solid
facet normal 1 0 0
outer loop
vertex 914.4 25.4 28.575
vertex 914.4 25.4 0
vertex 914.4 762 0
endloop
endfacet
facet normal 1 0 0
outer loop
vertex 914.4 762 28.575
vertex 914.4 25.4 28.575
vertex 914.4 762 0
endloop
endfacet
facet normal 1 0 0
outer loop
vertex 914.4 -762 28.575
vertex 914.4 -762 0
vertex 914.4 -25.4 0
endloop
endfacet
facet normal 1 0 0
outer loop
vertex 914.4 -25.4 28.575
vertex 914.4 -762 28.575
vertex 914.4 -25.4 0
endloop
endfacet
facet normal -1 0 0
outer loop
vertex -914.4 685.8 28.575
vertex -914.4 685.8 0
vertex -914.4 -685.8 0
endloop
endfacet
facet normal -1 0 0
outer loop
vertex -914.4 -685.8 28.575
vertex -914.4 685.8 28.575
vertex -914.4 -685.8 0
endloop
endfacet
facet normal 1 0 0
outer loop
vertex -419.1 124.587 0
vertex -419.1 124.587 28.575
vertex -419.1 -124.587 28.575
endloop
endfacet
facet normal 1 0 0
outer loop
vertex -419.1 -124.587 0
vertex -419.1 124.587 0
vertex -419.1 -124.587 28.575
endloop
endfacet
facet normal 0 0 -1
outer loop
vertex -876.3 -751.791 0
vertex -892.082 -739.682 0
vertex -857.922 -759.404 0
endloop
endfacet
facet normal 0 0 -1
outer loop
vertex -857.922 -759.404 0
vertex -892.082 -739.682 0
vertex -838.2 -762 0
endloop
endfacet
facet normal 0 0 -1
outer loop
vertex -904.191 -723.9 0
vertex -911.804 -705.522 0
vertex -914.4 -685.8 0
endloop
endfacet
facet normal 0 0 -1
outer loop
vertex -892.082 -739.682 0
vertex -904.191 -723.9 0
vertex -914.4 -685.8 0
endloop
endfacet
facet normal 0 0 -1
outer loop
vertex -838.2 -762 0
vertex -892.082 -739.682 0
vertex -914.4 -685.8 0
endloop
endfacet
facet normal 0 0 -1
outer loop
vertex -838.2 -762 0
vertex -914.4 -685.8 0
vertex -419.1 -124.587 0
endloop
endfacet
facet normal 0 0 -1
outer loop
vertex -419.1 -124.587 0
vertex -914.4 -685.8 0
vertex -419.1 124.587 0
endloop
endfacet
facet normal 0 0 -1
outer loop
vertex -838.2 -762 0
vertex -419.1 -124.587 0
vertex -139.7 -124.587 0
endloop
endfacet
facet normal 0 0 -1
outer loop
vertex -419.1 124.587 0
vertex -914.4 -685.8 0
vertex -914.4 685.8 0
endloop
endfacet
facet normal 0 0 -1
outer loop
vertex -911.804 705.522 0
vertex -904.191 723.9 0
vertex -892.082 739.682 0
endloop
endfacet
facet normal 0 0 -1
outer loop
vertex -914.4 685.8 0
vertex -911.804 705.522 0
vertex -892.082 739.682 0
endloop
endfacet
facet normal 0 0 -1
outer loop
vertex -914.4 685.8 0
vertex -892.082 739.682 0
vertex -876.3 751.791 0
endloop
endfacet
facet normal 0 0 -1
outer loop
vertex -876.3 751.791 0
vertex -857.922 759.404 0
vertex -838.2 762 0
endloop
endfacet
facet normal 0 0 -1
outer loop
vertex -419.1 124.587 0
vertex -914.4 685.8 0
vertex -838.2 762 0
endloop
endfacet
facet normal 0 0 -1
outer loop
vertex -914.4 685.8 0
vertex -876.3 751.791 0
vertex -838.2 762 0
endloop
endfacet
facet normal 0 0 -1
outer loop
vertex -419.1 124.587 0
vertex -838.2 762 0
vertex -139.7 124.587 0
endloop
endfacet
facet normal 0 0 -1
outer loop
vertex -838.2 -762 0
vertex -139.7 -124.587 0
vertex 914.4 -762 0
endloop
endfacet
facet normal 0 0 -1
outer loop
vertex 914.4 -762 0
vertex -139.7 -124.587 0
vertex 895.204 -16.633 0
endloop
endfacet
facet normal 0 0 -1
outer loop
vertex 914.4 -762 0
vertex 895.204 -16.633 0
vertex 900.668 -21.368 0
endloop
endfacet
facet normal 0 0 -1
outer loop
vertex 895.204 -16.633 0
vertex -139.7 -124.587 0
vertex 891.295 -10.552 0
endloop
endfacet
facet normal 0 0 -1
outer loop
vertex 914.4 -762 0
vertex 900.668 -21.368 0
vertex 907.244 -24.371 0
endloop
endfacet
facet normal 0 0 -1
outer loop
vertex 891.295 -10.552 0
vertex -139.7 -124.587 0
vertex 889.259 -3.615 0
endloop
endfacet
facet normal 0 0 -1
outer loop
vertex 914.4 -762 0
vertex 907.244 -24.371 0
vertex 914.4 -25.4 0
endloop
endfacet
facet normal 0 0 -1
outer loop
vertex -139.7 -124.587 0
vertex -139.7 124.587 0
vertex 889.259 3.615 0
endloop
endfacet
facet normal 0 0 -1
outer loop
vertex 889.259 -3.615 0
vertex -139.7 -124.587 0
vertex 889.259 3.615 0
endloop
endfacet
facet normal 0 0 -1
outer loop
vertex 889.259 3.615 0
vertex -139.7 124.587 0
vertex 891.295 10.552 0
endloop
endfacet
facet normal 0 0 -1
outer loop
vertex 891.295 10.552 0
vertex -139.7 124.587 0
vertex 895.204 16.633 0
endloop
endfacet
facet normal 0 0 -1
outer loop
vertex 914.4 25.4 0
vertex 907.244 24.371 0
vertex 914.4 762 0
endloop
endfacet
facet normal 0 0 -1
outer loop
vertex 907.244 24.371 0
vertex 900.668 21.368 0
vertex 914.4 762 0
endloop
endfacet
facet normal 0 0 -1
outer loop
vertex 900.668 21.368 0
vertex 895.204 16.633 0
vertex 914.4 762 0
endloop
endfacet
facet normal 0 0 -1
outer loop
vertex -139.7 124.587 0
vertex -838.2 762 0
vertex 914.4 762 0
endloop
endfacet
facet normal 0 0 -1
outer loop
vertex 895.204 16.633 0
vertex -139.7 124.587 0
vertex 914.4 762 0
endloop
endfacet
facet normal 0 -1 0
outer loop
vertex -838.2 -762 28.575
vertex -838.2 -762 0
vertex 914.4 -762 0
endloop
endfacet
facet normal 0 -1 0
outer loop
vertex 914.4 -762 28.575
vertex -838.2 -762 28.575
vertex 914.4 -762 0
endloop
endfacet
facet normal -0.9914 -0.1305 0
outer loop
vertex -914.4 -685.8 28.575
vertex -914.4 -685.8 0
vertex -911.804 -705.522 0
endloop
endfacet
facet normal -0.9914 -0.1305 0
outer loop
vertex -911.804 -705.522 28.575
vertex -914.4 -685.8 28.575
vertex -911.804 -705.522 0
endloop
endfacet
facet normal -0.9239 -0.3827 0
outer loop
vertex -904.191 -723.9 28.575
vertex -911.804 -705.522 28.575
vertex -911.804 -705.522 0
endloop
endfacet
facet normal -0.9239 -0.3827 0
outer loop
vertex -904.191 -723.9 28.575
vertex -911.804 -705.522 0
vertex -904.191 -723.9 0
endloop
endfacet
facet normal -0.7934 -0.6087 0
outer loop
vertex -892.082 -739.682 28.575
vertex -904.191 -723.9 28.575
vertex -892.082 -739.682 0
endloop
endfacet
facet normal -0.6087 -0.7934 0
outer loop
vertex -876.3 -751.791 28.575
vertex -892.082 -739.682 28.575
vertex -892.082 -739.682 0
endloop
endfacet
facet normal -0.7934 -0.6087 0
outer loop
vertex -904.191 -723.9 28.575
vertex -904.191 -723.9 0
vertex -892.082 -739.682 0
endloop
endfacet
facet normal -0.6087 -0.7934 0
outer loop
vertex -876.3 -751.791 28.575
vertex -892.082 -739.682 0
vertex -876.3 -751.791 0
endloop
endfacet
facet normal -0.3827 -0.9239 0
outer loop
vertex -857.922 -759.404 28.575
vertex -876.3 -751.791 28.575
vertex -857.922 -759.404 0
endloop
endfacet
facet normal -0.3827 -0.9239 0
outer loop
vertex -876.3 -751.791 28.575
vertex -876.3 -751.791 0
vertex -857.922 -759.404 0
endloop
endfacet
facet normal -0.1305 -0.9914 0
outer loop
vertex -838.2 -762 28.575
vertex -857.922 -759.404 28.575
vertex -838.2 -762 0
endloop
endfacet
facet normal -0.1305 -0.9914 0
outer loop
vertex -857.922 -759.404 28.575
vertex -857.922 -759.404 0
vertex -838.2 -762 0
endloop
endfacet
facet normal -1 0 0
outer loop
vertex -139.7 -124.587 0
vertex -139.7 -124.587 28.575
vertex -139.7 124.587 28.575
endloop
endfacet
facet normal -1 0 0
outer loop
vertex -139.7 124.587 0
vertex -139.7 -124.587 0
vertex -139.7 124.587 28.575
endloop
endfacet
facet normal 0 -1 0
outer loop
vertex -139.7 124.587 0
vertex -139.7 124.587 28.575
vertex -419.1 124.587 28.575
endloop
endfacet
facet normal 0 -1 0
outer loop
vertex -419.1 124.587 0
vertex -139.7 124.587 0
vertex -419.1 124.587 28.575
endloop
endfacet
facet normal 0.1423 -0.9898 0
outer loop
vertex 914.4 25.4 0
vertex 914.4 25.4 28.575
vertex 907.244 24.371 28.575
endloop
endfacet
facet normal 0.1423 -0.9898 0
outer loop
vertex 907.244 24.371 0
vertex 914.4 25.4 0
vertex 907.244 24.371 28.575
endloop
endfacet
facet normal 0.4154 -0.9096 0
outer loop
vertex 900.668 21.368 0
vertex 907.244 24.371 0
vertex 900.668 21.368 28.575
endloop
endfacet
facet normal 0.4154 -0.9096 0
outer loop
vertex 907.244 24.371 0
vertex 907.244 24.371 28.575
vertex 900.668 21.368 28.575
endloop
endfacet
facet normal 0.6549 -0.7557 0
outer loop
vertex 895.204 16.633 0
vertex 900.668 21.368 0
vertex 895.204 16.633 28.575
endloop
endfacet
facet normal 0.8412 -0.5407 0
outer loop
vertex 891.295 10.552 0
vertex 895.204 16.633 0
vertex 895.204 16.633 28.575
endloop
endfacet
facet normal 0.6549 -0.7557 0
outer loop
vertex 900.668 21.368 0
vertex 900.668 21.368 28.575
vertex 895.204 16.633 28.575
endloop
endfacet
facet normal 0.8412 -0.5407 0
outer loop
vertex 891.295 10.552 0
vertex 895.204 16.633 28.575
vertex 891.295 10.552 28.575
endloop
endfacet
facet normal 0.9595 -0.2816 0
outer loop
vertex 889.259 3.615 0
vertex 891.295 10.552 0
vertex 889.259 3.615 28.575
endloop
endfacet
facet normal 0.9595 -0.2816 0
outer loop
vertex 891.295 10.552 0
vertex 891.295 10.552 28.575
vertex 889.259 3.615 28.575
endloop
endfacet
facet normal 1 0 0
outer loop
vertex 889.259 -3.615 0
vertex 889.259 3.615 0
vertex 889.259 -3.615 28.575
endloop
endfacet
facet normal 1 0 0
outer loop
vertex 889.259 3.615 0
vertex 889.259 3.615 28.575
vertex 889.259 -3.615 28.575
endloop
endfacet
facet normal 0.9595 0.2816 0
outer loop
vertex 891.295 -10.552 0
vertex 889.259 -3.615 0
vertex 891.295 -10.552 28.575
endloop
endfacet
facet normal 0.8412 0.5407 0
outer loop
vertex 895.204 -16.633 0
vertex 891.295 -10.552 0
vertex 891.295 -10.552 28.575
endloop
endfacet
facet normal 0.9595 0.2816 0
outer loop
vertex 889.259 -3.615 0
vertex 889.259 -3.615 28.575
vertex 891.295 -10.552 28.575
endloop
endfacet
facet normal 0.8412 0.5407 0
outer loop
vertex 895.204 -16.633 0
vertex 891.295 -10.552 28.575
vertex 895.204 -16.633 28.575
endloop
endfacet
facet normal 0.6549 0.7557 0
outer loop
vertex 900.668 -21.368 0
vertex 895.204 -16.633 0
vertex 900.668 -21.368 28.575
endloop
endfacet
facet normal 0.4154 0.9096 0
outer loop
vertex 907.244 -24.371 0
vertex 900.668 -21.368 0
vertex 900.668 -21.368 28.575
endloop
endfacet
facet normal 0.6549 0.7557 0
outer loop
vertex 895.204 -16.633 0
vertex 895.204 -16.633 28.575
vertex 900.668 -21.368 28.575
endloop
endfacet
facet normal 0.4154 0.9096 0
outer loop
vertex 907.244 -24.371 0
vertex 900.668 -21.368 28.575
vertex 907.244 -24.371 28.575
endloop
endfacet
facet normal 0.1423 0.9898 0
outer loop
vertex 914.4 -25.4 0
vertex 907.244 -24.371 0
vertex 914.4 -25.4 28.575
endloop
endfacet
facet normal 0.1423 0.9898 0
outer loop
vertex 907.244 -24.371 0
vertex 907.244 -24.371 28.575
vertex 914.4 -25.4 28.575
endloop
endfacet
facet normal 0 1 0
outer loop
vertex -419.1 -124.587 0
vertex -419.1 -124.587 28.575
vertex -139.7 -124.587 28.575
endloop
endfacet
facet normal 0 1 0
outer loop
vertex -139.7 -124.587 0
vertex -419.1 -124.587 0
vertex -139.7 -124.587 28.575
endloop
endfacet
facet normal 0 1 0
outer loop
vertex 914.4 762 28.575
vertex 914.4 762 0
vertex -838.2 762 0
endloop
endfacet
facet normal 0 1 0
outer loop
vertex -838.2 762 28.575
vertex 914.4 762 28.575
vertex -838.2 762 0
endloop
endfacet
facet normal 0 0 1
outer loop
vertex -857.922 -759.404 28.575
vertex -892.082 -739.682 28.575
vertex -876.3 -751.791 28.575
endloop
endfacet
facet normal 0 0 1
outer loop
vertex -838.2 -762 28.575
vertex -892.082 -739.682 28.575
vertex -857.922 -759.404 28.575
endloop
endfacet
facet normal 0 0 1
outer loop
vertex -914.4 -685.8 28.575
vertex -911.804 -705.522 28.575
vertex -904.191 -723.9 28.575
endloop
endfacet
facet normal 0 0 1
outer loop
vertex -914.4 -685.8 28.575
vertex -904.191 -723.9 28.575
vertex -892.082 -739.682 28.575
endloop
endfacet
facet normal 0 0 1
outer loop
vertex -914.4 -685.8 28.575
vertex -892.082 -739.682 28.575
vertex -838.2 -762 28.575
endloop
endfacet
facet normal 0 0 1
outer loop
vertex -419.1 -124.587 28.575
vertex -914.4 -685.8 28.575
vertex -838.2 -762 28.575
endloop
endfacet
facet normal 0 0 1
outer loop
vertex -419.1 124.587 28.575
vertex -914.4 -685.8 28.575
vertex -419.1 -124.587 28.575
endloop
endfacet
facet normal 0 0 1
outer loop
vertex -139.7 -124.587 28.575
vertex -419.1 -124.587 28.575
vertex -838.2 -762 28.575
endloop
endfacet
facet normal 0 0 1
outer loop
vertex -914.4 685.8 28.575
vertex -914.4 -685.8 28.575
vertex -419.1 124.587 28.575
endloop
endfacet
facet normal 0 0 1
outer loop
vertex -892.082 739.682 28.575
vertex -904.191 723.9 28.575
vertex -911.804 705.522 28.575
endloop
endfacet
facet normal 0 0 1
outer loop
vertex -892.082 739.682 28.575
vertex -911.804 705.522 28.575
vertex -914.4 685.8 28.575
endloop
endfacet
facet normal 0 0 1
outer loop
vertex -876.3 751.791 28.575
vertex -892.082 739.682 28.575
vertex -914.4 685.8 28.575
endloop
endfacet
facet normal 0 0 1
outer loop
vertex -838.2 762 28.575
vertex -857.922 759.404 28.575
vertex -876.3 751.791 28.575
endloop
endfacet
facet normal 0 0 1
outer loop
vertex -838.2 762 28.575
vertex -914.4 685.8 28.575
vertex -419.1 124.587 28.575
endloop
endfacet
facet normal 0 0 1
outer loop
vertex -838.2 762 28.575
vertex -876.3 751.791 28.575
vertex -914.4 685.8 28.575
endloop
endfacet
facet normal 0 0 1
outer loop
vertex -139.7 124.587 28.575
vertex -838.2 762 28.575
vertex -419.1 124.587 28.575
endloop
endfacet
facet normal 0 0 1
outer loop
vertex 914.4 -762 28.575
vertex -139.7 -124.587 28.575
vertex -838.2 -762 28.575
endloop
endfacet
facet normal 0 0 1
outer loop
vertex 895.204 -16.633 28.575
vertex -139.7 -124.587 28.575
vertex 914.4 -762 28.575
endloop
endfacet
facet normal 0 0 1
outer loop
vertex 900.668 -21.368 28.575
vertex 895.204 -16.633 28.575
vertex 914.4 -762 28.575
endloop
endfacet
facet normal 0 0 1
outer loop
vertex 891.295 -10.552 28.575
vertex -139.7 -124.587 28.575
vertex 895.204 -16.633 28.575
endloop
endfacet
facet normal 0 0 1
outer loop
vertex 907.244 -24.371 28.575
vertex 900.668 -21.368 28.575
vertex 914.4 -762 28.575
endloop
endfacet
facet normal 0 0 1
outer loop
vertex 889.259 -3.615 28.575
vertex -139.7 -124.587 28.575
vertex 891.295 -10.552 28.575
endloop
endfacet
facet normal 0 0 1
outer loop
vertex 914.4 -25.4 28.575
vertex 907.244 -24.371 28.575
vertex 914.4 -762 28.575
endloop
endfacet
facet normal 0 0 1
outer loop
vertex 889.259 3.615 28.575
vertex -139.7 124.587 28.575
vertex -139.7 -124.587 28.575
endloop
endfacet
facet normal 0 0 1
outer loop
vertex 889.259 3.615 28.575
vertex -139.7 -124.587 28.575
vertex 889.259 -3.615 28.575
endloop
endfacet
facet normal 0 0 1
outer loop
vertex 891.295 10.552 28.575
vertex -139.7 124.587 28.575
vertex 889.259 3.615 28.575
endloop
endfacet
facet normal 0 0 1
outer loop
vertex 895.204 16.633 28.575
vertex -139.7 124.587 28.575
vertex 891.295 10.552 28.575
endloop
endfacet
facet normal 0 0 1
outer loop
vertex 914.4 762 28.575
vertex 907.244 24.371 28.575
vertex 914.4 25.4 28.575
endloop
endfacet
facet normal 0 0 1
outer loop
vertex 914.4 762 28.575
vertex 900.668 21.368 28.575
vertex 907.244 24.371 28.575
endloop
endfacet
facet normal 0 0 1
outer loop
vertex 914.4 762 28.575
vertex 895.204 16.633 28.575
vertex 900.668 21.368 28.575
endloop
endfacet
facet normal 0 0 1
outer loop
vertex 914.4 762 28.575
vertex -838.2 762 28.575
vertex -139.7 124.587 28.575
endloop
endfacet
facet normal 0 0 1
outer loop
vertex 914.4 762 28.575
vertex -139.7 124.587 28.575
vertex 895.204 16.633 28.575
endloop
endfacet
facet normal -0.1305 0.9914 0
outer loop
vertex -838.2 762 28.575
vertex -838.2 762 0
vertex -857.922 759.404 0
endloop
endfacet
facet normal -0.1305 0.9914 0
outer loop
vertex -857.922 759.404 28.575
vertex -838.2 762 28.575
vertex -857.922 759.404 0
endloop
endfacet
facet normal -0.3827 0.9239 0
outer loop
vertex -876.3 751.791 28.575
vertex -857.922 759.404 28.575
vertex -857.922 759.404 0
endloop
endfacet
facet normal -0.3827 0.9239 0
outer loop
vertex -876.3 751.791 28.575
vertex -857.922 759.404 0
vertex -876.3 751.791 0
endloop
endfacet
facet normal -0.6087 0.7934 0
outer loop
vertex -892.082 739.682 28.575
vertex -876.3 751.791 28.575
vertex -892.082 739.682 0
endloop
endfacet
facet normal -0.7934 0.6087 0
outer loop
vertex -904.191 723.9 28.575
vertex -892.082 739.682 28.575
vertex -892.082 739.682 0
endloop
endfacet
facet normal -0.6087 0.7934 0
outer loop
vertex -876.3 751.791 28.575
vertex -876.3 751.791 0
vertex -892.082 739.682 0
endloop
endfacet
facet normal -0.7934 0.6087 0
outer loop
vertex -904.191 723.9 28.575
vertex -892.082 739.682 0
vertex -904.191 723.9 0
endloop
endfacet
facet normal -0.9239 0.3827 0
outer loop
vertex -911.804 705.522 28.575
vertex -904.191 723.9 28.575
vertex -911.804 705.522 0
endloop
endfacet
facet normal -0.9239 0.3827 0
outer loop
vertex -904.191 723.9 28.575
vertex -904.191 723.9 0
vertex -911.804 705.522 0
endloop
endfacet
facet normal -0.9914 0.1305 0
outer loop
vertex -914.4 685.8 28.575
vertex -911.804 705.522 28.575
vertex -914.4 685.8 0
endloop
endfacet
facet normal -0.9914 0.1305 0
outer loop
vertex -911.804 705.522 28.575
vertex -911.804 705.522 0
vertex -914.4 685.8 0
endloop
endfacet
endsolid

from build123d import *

# Parameters (mm, degrees)
F1_DEPTH = 28.575
F3_DEPTH = 28.575


with BuildPart() as f1:
    # F0 (on Top) → F1 (new body)
    with BuildSketch(Plane.XY):
        with BuildLine():
            Line((914.4, -762), (914.4, 762))
            Line((914.4, 762), (-838.2, 762))
            ThreePointArc((-838.2, 762), (-892.081537, 739.681537), (-914.4, 685.8))
            Line((-914.4, 685.8), (-914.4, -685.8))
            ThreePointArc((-914.4, -685.8), (-892.081537, -739.681537), (-838.2, -762))
            Line((-838.2, -762), (914.4, -762))
        make_face()
    extrude(amount=F1_DEPTH)

    # F2 (on face) → F3 (cut)
    with BuildSketch(Plane.XY.offset(28.575)):
        Polygon((-139.7, 0), (-139.7, 124.587), (-419.1, 124.587), (-419.1, -124.587), (-139.7, -124.587), align=None)
        with BuildLine():
            Line((914.4, -25.4), (914.4, 25.4))
            ThreePointArc((914.4, 25.4), (889, 0), (914.4, -25.4))
        make_face()
    extrude(amount=-F3_DEPTH, mode=Mode.SUBTRACT)


solid = f1.part
